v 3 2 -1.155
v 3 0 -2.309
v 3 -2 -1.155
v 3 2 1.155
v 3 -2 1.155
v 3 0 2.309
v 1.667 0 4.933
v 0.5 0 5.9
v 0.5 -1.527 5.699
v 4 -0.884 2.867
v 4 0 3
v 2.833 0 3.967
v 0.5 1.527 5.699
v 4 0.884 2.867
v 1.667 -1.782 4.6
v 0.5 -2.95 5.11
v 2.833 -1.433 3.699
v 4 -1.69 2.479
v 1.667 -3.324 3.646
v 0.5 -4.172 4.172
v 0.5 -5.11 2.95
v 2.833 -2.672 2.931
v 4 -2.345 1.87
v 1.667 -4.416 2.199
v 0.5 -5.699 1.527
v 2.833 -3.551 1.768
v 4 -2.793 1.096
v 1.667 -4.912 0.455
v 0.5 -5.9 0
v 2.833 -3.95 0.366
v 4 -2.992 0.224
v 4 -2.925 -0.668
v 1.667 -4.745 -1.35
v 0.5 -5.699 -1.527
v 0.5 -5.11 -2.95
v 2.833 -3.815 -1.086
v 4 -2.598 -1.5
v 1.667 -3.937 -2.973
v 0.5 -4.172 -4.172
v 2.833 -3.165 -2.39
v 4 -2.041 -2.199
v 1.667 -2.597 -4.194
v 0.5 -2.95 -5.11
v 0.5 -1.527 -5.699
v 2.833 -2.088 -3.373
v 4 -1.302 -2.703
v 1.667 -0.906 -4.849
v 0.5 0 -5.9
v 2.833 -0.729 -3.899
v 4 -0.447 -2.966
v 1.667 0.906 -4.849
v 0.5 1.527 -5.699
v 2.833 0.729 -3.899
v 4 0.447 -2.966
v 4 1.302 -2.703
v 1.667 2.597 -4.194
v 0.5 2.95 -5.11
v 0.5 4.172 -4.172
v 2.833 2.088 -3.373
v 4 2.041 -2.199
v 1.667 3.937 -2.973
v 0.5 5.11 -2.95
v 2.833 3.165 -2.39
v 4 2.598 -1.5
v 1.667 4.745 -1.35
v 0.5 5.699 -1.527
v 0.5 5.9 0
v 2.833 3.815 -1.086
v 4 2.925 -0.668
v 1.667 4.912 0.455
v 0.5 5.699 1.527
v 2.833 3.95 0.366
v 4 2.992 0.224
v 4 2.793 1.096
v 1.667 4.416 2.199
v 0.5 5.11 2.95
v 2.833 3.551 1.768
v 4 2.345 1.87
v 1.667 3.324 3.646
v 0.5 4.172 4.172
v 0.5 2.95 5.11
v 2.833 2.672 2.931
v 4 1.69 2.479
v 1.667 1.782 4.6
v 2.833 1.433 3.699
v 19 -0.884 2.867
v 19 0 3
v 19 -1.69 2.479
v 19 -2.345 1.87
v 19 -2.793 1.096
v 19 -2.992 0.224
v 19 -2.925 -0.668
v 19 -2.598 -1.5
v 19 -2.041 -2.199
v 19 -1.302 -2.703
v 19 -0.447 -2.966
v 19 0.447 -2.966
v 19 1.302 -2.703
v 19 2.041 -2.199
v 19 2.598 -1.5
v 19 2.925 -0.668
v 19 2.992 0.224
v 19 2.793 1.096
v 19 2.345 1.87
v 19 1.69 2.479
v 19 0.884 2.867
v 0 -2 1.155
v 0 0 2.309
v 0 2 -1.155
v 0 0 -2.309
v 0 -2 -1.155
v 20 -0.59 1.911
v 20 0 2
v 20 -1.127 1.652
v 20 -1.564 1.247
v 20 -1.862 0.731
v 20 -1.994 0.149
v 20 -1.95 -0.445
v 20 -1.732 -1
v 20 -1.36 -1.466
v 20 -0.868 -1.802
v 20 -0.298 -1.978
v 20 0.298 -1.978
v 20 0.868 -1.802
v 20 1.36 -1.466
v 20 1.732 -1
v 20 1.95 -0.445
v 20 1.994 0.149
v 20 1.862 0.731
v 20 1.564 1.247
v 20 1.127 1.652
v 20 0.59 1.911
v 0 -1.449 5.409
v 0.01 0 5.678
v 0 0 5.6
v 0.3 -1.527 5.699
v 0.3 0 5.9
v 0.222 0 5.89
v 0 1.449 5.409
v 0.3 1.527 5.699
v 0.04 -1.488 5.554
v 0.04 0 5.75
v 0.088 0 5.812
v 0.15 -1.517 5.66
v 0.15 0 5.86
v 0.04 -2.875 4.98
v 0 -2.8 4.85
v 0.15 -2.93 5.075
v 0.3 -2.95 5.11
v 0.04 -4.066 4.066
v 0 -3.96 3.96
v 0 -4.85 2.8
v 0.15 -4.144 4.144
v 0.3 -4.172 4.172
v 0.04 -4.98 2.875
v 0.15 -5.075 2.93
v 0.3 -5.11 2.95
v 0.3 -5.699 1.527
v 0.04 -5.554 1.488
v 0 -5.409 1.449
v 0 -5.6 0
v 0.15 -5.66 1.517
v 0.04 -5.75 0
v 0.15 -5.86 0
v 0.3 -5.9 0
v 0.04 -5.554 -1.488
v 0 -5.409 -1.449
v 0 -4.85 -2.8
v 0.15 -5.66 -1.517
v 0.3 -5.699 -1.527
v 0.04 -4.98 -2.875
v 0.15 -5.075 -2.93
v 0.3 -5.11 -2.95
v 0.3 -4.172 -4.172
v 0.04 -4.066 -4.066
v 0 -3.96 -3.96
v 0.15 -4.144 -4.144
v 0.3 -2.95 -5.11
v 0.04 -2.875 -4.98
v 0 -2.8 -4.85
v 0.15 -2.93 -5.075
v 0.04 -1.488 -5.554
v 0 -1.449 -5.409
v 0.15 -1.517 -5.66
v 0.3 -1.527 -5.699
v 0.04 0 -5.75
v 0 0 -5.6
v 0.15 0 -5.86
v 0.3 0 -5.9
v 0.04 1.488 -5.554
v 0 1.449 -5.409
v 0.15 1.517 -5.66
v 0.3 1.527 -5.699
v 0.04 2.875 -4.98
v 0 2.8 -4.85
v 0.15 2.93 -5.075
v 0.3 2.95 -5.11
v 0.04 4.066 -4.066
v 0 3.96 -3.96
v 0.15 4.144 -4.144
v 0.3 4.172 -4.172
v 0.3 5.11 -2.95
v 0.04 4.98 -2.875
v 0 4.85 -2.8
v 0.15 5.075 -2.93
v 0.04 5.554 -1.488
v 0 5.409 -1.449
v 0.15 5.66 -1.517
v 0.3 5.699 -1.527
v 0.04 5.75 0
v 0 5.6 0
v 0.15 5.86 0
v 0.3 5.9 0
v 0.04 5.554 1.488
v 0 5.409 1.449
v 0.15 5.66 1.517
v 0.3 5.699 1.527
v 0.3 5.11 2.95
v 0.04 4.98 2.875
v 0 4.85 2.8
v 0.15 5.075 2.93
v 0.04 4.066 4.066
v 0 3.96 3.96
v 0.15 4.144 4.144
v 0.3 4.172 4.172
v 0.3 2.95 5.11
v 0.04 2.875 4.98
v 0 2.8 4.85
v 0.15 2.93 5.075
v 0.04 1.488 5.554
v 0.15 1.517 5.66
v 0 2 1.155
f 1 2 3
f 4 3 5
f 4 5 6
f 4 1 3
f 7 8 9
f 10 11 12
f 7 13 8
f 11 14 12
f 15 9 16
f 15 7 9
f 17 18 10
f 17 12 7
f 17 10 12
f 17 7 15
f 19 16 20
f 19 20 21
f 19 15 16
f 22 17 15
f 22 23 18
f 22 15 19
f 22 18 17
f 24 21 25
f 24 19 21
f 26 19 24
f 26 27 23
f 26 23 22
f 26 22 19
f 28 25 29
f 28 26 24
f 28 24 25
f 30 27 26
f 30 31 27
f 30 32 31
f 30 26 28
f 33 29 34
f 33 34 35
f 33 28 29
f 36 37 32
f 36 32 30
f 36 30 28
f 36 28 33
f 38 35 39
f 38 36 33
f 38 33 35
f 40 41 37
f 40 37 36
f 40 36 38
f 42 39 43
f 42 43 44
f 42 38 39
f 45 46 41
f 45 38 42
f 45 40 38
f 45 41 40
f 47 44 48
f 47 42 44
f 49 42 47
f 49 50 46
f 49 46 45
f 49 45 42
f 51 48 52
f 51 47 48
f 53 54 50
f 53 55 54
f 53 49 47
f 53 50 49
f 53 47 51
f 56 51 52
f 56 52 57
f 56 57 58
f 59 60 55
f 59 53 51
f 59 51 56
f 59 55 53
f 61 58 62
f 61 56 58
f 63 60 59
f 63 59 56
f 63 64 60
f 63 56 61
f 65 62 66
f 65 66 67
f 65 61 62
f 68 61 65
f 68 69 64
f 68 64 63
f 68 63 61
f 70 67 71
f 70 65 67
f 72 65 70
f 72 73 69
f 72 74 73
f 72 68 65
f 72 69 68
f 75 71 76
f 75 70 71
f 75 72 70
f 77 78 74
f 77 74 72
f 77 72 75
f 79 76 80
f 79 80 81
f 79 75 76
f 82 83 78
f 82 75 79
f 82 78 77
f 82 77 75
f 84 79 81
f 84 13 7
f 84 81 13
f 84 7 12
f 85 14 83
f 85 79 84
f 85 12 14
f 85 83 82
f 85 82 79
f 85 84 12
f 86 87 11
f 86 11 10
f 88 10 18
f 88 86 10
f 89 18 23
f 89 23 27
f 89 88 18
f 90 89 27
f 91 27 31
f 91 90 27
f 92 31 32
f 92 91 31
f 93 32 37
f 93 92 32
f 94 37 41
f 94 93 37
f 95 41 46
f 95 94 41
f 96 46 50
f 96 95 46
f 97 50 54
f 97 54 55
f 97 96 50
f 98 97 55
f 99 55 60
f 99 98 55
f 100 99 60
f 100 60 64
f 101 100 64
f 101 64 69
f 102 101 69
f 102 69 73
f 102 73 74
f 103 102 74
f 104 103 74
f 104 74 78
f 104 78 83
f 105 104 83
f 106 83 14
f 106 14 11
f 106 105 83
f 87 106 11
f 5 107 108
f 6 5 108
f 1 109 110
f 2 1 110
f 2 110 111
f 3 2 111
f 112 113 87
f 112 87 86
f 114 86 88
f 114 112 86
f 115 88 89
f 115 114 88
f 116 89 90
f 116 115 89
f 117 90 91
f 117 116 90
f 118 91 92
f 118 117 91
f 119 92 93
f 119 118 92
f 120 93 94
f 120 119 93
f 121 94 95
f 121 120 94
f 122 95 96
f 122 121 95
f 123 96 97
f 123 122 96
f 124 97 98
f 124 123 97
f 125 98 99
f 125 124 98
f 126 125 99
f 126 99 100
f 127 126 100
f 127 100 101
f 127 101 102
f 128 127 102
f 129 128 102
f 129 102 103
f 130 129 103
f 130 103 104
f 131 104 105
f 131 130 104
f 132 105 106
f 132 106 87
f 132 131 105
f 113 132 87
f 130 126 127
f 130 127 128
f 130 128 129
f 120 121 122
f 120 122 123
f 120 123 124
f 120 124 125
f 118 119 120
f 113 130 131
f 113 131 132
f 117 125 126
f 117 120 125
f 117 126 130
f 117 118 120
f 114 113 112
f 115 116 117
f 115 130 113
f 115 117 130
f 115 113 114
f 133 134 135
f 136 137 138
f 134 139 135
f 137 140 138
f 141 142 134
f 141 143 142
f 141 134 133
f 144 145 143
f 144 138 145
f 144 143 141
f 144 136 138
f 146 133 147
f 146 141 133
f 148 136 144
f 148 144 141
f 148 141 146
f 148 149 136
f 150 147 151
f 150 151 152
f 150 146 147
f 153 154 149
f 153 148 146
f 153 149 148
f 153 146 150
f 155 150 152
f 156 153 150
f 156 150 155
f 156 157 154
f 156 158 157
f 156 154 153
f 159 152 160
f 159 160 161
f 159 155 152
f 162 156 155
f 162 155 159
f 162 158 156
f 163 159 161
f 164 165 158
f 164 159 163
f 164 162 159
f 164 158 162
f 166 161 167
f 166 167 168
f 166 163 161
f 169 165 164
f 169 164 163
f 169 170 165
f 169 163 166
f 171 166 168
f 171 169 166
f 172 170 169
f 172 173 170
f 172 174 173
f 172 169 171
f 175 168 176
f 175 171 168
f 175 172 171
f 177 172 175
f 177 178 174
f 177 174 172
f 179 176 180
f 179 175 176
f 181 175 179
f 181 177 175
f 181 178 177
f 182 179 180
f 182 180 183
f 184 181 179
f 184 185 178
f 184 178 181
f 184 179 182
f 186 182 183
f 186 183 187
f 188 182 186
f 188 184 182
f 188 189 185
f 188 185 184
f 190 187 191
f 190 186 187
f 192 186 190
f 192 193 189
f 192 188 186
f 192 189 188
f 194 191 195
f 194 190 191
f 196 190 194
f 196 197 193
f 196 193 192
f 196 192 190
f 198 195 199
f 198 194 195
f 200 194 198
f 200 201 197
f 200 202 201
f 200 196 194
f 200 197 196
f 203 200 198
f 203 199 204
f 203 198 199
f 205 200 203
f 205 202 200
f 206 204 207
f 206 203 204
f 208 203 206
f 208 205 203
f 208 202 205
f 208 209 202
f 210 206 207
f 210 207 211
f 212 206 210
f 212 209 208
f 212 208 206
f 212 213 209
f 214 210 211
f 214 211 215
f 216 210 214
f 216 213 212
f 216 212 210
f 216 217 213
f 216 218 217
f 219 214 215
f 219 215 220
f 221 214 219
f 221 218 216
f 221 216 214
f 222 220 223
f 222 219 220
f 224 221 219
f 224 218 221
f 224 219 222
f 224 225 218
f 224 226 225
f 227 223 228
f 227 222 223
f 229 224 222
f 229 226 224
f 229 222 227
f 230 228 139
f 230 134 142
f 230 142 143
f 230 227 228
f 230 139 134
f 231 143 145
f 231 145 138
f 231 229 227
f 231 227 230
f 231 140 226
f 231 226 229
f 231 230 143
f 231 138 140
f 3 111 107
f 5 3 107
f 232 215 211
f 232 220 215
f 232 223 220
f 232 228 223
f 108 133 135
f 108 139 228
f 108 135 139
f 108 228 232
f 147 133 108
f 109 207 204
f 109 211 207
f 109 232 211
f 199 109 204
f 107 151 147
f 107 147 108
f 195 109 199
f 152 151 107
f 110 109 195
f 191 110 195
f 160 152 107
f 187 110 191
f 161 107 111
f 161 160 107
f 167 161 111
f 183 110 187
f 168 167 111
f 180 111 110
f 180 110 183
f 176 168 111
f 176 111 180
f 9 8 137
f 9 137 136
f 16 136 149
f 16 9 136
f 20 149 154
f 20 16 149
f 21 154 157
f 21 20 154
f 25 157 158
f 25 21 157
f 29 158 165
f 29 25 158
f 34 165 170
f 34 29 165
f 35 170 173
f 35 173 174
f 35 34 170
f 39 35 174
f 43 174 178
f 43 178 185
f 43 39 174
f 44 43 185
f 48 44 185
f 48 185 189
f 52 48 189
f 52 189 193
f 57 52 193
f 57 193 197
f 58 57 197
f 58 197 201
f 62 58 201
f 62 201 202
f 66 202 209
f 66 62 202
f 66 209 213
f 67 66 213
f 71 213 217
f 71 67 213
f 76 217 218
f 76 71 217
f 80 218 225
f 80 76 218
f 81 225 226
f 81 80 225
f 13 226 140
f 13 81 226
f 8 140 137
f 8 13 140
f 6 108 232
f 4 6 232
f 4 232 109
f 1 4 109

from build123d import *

# Parameters (mm, degrees)
CUT_EXTRUDE_1_DEPTH = 3
FILLET_1_R          = 0.3
CHAMFER_1_SIZE      = 1


with BuildPart() as part:
    # Эскиз1 → Повернуть1 (revolve)
    with BuildSketch(Plane.XY, mode=Mode.PRIVATE) as revolve_1_sk:
        Polygon((0, 0), (0, 5.9), (0.5, 5.9), (4, 3), (20, 3), (20, 0), align=None)
    revolve(revolve_1_sk.sketch.rotate(Axis((0, 0, 0), (1, 0, 0)), 90), axis=Axis((0, 0, 0), (1, 0, 0)))  # turned: the seam where the file's is

    # Эскиз2 → Вырез-Вытянуть1 (cut)
    with BuildSketch(Plane.ZY):
        Polygon((1.154700538, 2), (-1.154700538, 2), (-2.309401077, 0), (-1.154700538, -2), (1.154700538, -2), (2.309401077, 0), align=None)
    extrude(amount=-CUT_EXTRUDE_1_DEPTH, mode=Mode.SUBTRACT)

    # Скругление1
    fillet_1_edges = [part.edges().sort_by_distance(p)[0] for p in [
        (0, 0, -5.9),
    ]]
    fillet(fillet_1_edges, radius=FILLET_1_R)

    # Фаска1
    chamfer_1_edges = [part.edges().sort_by_distance(p)[0] for p in [
        (20, 0, -3),
    ]]
    chamfer(chamfer_1_edges, length=CHAMFER_1_SIZE)


solid = part.part
